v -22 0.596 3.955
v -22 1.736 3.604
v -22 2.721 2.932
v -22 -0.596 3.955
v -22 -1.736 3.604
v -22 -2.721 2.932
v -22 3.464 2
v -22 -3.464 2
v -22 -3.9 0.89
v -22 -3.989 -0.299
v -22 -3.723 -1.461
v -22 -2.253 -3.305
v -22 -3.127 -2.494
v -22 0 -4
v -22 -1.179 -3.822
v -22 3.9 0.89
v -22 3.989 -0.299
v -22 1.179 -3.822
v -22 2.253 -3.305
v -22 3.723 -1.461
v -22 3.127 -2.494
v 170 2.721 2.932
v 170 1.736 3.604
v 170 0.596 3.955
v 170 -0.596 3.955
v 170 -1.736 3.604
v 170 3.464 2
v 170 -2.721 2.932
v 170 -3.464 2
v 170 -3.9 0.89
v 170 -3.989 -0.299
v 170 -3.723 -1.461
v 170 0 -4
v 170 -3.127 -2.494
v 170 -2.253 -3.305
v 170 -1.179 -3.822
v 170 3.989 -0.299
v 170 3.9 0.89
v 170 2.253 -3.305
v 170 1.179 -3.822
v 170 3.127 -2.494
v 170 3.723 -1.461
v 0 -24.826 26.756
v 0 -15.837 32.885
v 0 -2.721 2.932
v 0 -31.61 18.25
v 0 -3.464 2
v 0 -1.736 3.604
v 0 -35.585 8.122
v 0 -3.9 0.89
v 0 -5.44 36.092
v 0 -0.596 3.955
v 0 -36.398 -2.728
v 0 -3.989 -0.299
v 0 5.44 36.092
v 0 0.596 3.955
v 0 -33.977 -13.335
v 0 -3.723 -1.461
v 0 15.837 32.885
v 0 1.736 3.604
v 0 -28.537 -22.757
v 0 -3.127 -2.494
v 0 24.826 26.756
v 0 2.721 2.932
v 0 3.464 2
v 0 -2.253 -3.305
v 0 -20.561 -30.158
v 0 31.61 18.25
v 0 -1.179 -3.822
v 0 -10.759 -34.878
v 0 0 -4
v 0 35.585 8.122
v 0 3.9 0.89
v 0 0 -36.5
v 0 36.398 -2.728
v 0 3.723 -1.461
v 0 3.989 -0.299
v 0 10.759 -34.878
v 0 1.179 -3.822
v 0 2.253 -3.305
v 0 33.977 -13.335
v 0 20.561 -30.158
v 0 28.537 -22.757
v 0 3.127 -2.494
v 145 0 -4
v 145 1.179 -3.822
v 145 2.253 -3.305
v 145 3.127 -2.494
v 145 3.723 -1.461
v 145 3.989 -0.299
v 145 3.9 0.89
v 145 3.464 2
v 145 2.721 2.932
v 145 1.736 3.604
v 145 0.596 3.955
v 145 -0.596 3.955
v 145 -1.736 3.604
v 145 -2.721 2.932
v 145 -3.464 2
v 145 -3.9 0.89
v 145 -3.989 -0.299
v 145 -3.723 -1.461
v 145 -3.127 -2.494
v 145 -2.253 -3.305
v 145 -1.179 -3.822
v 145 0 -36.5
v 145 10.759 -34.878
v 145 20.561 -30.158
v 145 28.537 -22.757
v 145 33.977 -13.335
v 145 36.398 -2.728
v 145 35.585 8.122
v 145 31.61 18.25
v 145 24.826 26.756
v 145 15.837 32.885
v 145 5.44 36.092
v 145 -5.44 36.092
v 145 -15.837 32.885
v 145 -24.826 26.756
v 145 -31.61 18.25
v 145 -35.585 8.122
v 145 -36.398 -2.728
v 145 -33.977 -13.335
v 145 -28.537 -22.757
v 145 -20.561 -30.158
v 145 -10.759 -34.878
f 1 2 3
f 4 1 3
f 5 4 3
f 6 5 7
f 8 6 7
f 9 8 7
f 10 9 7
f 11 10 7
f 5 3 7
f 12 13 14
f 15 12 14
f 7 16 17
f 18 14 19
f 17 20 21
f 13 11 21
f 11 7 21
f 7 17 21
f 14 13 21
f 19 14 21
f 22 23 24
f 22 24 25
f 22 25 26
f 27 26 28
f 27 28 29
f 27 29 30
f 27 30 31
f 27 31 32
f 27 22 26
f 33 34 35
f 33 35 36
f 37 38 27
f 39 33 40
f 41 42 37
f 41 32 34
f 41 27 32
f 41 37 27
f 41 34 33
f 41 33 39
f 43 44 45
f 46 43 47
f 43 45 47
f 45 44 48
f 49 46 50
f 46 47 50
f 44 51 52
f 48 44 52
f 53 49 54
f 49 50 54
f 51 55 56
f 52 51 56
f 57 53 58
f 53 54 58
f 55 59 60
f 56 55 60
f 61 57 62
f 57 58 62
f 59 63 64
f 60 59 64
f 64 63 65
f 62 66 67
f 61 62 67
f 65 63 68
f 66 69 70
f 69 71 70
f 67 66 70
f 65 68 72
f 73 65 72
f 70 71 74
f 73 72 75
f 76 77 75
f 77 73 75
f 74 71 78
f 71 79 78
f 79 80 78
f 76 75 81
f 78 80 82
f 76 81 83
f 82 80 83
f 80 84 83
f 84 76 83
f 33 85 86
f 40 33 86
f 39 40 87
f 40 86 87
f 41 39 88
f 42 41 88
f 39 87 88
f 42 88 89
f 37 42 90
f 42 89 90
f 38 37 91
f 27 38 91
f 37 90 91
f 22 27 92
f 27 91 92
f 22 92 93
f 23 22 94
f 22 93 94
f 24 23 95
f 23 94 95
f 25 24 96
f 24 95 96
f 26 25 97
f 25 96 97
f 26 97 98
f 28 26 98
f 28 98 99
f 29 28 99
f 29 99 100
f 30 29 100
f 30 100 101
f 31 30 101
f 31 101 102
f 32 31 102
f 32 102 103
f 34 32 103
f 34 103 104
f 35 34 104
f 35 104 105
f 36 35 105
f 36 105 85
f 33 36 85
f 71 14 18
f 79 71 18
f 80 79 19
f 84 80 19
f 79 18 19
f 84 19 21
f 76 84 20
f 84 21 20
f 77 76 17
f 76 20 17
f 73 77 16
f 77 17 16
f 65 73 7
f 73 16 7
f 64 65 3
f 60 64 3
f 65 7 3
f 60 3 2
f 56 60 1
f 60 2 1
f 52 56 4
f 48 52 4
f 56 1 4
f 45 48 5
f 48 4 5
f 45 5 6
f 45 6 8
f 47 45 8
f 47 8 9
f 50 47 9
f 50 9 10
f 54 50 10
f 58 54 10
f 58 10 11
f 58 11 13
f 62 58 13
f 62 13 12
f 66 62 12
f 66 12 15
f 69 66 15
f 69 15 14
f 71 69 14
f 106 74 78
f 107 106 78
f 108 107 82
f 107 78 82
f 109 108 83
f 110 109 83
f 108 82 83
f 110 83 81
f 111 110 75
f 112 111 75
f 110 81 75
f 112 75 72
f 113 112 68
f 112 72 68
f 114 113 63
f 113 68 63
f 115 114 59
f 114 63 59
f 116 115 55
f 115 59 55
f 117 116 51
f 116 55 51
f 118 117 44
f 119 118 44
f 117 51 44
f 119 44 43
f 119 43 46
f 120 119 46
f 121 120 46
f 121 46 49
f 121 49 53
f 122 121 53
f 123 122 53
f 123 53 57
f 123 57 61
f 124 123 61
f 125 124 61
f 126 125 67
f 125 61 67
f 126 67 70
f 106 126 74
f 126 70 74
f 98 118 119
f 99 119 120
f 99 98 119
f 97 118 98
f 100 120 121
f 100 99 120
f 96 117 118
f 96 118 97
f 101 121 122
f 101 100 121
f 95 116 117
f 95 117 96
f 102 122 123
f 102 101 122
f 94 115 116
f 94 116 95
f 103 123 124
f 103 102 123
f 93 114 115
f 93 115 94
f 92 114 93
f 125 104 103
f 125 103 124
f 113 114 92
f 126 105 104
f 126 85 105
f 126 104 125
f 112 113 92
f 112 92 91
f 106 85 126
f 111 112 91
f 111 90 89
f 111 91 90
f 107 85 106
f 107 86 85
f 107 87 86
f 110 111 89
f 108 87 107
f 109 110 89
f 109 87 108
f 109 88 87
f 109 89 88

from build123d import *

# Parameters (mm, degrees)
SKETCH1_R                = 36.5
SKETCH1_R_2              = 4
BOSS_EXTRUDE1_DEPTH      = 145
BOSS_EXTRUDE2_DEPTH      = 170
BOSS_EXTRUDE2_DEPTH_BACK = 22
SKETCH1_3_R              = 4


with BuildPart() as part:
    # Sketch1 → Boss-Extrude1 (new body)
    with BuildSketch(Plane(origin=(0, 0, 0), x_dir=(0, 0, -1), z_dir=(1, 0, 0))):
        Circle(SKETCH1_R)
        Circle(SKETCH1_R_2, mode=Mode.SUBTRACT)
    extrude(amount=BOSS_EXTRUDE1_DEPTH)

    # Sketch1<3> → Boss-Extrude2 (add, two sides: drawn at the far end of the back side and taken through both)
    with BuildSketch(Plane(origin=(0, 0, 0), x_dir=(0, 0, -1), z_dir=(1, 0, 0)).offset(-BOSS_EXTRUDE2_DEPTH_BACK)):
        Circle(SKETCH1_3_R)
    extrude(amount=BOSS_EXTRUDE2_DEPTH + BOSS_EXTRUDE2_DEPTH_BACK)


solid = part.part
